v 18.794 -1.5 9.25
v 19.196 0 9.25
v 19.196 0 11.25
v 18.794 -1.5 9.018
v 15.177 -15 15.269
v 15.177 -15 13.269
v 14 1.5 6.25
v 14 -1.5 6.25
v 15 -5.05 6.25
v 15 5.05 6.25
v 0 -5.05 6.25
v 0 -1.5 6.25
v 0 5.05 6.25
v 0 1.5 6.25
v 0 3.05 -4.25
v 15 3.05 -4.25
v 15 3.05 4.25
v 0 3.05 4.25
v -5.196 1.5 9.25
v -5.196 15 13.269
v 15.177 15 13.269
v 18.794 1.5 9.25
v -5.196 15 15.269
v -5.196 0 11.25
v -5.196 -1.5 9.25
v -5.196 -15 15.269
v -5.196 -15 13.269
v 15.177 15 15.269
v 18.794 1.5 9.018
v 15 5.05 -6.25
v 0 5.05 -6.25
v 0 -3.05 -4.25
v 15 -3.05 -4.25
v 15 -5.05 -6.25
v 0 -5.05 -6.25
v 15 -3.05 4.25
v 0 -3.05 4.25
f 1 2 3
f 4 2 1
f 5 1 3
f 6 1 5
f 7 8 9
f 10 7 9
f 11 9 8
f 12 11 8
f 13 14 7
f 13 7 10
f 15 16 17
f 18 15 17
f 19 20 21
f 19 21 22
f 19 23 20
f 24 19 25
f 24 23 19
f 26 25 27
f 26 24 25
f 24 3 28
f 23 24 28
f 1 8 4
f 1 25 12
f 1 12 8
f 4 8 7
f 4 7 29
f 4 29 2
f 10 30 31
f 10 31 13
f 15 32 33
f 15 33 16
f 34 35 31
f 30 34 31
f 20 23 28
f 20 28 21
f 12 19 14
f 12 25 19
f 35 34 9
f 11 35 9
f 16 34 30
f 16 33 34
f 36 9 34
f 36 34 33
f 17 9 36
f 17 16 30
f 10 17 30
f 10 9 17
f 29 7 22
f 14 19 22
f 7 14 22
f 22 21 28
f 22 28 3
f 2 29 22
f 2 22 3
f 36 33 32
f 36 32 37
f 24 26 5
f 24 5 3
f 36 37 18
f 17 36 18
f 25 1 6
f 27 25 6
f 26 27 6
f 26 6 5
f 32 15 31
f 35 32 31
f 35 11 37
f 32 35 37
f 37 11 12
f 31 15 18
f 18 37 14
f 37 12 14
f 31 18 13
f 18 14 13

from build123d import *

# Parameters (mm, degrees)
F0_W     = 10.1
F0_H     = 12.5
F0_W_2   = 6.1
F0_H_2   = 8.5
F1_DEPTH = 15
F3_DEPTH = 1.5
F5_DEPTH = 24.3923048454
F7_DEPTH = 25


with BuildPart() as f1:
    # F0 (on Right) → F1 (new body)
    with BuildSketch(Plane.YZ):
        Rectangle(F0_W, F0_H)
        Rectangle(F0_W_2, F0_H_2, mode=Mode.SUBTRACT)
    extrude(amount=F1_DEPTH)

    # F2 (on Front) → F3 (join, symmetric)
    with BuildSketch(Plane.XZ):
        Polygon((-5.1961524227, 9.25), (0, 6.25), (14, 6.25), (19.1961524227, 9.25), (19.1961524227, 11.25), (-5.1961524227, 11.25), align=None)
    extrude(amount=F3_DEPTH, both=True)

    # F4 (on face) → F5 (join, through all)
    with BuildSketch(Plane(origin=(-5.1961524227, 0, 0), x_dir=(0, -1, 0), z_dir=(-1, 0, 0))):
        Polygon((15, 15.2692378865), (0, 11.25), (1.5, 9.25), (15, 13.2692378865), align=None)
        Polygon((-1.5, 9.25), (0, 11.25), (-15, 15.2692378865), (-15, 13.2692378865), align=None)
    extrude(amount=-F5_DEPTH)

    # F6 (on Top) → F7 (cut)
    with BuildSketch(Plane.XY):
        Polygon((14.1379434391, 18.8774929223), (19.1961524227, 0), (14.1379434391, -18.8774929223), (27.2481460124, -18.8774929223), (27.2481460124, 0), (27.2481460124, 18.8774929223), align=None)
    extrude(amount=F7_DEPTH, mode=Mode.SUBTRACT)


solid = f1.part
